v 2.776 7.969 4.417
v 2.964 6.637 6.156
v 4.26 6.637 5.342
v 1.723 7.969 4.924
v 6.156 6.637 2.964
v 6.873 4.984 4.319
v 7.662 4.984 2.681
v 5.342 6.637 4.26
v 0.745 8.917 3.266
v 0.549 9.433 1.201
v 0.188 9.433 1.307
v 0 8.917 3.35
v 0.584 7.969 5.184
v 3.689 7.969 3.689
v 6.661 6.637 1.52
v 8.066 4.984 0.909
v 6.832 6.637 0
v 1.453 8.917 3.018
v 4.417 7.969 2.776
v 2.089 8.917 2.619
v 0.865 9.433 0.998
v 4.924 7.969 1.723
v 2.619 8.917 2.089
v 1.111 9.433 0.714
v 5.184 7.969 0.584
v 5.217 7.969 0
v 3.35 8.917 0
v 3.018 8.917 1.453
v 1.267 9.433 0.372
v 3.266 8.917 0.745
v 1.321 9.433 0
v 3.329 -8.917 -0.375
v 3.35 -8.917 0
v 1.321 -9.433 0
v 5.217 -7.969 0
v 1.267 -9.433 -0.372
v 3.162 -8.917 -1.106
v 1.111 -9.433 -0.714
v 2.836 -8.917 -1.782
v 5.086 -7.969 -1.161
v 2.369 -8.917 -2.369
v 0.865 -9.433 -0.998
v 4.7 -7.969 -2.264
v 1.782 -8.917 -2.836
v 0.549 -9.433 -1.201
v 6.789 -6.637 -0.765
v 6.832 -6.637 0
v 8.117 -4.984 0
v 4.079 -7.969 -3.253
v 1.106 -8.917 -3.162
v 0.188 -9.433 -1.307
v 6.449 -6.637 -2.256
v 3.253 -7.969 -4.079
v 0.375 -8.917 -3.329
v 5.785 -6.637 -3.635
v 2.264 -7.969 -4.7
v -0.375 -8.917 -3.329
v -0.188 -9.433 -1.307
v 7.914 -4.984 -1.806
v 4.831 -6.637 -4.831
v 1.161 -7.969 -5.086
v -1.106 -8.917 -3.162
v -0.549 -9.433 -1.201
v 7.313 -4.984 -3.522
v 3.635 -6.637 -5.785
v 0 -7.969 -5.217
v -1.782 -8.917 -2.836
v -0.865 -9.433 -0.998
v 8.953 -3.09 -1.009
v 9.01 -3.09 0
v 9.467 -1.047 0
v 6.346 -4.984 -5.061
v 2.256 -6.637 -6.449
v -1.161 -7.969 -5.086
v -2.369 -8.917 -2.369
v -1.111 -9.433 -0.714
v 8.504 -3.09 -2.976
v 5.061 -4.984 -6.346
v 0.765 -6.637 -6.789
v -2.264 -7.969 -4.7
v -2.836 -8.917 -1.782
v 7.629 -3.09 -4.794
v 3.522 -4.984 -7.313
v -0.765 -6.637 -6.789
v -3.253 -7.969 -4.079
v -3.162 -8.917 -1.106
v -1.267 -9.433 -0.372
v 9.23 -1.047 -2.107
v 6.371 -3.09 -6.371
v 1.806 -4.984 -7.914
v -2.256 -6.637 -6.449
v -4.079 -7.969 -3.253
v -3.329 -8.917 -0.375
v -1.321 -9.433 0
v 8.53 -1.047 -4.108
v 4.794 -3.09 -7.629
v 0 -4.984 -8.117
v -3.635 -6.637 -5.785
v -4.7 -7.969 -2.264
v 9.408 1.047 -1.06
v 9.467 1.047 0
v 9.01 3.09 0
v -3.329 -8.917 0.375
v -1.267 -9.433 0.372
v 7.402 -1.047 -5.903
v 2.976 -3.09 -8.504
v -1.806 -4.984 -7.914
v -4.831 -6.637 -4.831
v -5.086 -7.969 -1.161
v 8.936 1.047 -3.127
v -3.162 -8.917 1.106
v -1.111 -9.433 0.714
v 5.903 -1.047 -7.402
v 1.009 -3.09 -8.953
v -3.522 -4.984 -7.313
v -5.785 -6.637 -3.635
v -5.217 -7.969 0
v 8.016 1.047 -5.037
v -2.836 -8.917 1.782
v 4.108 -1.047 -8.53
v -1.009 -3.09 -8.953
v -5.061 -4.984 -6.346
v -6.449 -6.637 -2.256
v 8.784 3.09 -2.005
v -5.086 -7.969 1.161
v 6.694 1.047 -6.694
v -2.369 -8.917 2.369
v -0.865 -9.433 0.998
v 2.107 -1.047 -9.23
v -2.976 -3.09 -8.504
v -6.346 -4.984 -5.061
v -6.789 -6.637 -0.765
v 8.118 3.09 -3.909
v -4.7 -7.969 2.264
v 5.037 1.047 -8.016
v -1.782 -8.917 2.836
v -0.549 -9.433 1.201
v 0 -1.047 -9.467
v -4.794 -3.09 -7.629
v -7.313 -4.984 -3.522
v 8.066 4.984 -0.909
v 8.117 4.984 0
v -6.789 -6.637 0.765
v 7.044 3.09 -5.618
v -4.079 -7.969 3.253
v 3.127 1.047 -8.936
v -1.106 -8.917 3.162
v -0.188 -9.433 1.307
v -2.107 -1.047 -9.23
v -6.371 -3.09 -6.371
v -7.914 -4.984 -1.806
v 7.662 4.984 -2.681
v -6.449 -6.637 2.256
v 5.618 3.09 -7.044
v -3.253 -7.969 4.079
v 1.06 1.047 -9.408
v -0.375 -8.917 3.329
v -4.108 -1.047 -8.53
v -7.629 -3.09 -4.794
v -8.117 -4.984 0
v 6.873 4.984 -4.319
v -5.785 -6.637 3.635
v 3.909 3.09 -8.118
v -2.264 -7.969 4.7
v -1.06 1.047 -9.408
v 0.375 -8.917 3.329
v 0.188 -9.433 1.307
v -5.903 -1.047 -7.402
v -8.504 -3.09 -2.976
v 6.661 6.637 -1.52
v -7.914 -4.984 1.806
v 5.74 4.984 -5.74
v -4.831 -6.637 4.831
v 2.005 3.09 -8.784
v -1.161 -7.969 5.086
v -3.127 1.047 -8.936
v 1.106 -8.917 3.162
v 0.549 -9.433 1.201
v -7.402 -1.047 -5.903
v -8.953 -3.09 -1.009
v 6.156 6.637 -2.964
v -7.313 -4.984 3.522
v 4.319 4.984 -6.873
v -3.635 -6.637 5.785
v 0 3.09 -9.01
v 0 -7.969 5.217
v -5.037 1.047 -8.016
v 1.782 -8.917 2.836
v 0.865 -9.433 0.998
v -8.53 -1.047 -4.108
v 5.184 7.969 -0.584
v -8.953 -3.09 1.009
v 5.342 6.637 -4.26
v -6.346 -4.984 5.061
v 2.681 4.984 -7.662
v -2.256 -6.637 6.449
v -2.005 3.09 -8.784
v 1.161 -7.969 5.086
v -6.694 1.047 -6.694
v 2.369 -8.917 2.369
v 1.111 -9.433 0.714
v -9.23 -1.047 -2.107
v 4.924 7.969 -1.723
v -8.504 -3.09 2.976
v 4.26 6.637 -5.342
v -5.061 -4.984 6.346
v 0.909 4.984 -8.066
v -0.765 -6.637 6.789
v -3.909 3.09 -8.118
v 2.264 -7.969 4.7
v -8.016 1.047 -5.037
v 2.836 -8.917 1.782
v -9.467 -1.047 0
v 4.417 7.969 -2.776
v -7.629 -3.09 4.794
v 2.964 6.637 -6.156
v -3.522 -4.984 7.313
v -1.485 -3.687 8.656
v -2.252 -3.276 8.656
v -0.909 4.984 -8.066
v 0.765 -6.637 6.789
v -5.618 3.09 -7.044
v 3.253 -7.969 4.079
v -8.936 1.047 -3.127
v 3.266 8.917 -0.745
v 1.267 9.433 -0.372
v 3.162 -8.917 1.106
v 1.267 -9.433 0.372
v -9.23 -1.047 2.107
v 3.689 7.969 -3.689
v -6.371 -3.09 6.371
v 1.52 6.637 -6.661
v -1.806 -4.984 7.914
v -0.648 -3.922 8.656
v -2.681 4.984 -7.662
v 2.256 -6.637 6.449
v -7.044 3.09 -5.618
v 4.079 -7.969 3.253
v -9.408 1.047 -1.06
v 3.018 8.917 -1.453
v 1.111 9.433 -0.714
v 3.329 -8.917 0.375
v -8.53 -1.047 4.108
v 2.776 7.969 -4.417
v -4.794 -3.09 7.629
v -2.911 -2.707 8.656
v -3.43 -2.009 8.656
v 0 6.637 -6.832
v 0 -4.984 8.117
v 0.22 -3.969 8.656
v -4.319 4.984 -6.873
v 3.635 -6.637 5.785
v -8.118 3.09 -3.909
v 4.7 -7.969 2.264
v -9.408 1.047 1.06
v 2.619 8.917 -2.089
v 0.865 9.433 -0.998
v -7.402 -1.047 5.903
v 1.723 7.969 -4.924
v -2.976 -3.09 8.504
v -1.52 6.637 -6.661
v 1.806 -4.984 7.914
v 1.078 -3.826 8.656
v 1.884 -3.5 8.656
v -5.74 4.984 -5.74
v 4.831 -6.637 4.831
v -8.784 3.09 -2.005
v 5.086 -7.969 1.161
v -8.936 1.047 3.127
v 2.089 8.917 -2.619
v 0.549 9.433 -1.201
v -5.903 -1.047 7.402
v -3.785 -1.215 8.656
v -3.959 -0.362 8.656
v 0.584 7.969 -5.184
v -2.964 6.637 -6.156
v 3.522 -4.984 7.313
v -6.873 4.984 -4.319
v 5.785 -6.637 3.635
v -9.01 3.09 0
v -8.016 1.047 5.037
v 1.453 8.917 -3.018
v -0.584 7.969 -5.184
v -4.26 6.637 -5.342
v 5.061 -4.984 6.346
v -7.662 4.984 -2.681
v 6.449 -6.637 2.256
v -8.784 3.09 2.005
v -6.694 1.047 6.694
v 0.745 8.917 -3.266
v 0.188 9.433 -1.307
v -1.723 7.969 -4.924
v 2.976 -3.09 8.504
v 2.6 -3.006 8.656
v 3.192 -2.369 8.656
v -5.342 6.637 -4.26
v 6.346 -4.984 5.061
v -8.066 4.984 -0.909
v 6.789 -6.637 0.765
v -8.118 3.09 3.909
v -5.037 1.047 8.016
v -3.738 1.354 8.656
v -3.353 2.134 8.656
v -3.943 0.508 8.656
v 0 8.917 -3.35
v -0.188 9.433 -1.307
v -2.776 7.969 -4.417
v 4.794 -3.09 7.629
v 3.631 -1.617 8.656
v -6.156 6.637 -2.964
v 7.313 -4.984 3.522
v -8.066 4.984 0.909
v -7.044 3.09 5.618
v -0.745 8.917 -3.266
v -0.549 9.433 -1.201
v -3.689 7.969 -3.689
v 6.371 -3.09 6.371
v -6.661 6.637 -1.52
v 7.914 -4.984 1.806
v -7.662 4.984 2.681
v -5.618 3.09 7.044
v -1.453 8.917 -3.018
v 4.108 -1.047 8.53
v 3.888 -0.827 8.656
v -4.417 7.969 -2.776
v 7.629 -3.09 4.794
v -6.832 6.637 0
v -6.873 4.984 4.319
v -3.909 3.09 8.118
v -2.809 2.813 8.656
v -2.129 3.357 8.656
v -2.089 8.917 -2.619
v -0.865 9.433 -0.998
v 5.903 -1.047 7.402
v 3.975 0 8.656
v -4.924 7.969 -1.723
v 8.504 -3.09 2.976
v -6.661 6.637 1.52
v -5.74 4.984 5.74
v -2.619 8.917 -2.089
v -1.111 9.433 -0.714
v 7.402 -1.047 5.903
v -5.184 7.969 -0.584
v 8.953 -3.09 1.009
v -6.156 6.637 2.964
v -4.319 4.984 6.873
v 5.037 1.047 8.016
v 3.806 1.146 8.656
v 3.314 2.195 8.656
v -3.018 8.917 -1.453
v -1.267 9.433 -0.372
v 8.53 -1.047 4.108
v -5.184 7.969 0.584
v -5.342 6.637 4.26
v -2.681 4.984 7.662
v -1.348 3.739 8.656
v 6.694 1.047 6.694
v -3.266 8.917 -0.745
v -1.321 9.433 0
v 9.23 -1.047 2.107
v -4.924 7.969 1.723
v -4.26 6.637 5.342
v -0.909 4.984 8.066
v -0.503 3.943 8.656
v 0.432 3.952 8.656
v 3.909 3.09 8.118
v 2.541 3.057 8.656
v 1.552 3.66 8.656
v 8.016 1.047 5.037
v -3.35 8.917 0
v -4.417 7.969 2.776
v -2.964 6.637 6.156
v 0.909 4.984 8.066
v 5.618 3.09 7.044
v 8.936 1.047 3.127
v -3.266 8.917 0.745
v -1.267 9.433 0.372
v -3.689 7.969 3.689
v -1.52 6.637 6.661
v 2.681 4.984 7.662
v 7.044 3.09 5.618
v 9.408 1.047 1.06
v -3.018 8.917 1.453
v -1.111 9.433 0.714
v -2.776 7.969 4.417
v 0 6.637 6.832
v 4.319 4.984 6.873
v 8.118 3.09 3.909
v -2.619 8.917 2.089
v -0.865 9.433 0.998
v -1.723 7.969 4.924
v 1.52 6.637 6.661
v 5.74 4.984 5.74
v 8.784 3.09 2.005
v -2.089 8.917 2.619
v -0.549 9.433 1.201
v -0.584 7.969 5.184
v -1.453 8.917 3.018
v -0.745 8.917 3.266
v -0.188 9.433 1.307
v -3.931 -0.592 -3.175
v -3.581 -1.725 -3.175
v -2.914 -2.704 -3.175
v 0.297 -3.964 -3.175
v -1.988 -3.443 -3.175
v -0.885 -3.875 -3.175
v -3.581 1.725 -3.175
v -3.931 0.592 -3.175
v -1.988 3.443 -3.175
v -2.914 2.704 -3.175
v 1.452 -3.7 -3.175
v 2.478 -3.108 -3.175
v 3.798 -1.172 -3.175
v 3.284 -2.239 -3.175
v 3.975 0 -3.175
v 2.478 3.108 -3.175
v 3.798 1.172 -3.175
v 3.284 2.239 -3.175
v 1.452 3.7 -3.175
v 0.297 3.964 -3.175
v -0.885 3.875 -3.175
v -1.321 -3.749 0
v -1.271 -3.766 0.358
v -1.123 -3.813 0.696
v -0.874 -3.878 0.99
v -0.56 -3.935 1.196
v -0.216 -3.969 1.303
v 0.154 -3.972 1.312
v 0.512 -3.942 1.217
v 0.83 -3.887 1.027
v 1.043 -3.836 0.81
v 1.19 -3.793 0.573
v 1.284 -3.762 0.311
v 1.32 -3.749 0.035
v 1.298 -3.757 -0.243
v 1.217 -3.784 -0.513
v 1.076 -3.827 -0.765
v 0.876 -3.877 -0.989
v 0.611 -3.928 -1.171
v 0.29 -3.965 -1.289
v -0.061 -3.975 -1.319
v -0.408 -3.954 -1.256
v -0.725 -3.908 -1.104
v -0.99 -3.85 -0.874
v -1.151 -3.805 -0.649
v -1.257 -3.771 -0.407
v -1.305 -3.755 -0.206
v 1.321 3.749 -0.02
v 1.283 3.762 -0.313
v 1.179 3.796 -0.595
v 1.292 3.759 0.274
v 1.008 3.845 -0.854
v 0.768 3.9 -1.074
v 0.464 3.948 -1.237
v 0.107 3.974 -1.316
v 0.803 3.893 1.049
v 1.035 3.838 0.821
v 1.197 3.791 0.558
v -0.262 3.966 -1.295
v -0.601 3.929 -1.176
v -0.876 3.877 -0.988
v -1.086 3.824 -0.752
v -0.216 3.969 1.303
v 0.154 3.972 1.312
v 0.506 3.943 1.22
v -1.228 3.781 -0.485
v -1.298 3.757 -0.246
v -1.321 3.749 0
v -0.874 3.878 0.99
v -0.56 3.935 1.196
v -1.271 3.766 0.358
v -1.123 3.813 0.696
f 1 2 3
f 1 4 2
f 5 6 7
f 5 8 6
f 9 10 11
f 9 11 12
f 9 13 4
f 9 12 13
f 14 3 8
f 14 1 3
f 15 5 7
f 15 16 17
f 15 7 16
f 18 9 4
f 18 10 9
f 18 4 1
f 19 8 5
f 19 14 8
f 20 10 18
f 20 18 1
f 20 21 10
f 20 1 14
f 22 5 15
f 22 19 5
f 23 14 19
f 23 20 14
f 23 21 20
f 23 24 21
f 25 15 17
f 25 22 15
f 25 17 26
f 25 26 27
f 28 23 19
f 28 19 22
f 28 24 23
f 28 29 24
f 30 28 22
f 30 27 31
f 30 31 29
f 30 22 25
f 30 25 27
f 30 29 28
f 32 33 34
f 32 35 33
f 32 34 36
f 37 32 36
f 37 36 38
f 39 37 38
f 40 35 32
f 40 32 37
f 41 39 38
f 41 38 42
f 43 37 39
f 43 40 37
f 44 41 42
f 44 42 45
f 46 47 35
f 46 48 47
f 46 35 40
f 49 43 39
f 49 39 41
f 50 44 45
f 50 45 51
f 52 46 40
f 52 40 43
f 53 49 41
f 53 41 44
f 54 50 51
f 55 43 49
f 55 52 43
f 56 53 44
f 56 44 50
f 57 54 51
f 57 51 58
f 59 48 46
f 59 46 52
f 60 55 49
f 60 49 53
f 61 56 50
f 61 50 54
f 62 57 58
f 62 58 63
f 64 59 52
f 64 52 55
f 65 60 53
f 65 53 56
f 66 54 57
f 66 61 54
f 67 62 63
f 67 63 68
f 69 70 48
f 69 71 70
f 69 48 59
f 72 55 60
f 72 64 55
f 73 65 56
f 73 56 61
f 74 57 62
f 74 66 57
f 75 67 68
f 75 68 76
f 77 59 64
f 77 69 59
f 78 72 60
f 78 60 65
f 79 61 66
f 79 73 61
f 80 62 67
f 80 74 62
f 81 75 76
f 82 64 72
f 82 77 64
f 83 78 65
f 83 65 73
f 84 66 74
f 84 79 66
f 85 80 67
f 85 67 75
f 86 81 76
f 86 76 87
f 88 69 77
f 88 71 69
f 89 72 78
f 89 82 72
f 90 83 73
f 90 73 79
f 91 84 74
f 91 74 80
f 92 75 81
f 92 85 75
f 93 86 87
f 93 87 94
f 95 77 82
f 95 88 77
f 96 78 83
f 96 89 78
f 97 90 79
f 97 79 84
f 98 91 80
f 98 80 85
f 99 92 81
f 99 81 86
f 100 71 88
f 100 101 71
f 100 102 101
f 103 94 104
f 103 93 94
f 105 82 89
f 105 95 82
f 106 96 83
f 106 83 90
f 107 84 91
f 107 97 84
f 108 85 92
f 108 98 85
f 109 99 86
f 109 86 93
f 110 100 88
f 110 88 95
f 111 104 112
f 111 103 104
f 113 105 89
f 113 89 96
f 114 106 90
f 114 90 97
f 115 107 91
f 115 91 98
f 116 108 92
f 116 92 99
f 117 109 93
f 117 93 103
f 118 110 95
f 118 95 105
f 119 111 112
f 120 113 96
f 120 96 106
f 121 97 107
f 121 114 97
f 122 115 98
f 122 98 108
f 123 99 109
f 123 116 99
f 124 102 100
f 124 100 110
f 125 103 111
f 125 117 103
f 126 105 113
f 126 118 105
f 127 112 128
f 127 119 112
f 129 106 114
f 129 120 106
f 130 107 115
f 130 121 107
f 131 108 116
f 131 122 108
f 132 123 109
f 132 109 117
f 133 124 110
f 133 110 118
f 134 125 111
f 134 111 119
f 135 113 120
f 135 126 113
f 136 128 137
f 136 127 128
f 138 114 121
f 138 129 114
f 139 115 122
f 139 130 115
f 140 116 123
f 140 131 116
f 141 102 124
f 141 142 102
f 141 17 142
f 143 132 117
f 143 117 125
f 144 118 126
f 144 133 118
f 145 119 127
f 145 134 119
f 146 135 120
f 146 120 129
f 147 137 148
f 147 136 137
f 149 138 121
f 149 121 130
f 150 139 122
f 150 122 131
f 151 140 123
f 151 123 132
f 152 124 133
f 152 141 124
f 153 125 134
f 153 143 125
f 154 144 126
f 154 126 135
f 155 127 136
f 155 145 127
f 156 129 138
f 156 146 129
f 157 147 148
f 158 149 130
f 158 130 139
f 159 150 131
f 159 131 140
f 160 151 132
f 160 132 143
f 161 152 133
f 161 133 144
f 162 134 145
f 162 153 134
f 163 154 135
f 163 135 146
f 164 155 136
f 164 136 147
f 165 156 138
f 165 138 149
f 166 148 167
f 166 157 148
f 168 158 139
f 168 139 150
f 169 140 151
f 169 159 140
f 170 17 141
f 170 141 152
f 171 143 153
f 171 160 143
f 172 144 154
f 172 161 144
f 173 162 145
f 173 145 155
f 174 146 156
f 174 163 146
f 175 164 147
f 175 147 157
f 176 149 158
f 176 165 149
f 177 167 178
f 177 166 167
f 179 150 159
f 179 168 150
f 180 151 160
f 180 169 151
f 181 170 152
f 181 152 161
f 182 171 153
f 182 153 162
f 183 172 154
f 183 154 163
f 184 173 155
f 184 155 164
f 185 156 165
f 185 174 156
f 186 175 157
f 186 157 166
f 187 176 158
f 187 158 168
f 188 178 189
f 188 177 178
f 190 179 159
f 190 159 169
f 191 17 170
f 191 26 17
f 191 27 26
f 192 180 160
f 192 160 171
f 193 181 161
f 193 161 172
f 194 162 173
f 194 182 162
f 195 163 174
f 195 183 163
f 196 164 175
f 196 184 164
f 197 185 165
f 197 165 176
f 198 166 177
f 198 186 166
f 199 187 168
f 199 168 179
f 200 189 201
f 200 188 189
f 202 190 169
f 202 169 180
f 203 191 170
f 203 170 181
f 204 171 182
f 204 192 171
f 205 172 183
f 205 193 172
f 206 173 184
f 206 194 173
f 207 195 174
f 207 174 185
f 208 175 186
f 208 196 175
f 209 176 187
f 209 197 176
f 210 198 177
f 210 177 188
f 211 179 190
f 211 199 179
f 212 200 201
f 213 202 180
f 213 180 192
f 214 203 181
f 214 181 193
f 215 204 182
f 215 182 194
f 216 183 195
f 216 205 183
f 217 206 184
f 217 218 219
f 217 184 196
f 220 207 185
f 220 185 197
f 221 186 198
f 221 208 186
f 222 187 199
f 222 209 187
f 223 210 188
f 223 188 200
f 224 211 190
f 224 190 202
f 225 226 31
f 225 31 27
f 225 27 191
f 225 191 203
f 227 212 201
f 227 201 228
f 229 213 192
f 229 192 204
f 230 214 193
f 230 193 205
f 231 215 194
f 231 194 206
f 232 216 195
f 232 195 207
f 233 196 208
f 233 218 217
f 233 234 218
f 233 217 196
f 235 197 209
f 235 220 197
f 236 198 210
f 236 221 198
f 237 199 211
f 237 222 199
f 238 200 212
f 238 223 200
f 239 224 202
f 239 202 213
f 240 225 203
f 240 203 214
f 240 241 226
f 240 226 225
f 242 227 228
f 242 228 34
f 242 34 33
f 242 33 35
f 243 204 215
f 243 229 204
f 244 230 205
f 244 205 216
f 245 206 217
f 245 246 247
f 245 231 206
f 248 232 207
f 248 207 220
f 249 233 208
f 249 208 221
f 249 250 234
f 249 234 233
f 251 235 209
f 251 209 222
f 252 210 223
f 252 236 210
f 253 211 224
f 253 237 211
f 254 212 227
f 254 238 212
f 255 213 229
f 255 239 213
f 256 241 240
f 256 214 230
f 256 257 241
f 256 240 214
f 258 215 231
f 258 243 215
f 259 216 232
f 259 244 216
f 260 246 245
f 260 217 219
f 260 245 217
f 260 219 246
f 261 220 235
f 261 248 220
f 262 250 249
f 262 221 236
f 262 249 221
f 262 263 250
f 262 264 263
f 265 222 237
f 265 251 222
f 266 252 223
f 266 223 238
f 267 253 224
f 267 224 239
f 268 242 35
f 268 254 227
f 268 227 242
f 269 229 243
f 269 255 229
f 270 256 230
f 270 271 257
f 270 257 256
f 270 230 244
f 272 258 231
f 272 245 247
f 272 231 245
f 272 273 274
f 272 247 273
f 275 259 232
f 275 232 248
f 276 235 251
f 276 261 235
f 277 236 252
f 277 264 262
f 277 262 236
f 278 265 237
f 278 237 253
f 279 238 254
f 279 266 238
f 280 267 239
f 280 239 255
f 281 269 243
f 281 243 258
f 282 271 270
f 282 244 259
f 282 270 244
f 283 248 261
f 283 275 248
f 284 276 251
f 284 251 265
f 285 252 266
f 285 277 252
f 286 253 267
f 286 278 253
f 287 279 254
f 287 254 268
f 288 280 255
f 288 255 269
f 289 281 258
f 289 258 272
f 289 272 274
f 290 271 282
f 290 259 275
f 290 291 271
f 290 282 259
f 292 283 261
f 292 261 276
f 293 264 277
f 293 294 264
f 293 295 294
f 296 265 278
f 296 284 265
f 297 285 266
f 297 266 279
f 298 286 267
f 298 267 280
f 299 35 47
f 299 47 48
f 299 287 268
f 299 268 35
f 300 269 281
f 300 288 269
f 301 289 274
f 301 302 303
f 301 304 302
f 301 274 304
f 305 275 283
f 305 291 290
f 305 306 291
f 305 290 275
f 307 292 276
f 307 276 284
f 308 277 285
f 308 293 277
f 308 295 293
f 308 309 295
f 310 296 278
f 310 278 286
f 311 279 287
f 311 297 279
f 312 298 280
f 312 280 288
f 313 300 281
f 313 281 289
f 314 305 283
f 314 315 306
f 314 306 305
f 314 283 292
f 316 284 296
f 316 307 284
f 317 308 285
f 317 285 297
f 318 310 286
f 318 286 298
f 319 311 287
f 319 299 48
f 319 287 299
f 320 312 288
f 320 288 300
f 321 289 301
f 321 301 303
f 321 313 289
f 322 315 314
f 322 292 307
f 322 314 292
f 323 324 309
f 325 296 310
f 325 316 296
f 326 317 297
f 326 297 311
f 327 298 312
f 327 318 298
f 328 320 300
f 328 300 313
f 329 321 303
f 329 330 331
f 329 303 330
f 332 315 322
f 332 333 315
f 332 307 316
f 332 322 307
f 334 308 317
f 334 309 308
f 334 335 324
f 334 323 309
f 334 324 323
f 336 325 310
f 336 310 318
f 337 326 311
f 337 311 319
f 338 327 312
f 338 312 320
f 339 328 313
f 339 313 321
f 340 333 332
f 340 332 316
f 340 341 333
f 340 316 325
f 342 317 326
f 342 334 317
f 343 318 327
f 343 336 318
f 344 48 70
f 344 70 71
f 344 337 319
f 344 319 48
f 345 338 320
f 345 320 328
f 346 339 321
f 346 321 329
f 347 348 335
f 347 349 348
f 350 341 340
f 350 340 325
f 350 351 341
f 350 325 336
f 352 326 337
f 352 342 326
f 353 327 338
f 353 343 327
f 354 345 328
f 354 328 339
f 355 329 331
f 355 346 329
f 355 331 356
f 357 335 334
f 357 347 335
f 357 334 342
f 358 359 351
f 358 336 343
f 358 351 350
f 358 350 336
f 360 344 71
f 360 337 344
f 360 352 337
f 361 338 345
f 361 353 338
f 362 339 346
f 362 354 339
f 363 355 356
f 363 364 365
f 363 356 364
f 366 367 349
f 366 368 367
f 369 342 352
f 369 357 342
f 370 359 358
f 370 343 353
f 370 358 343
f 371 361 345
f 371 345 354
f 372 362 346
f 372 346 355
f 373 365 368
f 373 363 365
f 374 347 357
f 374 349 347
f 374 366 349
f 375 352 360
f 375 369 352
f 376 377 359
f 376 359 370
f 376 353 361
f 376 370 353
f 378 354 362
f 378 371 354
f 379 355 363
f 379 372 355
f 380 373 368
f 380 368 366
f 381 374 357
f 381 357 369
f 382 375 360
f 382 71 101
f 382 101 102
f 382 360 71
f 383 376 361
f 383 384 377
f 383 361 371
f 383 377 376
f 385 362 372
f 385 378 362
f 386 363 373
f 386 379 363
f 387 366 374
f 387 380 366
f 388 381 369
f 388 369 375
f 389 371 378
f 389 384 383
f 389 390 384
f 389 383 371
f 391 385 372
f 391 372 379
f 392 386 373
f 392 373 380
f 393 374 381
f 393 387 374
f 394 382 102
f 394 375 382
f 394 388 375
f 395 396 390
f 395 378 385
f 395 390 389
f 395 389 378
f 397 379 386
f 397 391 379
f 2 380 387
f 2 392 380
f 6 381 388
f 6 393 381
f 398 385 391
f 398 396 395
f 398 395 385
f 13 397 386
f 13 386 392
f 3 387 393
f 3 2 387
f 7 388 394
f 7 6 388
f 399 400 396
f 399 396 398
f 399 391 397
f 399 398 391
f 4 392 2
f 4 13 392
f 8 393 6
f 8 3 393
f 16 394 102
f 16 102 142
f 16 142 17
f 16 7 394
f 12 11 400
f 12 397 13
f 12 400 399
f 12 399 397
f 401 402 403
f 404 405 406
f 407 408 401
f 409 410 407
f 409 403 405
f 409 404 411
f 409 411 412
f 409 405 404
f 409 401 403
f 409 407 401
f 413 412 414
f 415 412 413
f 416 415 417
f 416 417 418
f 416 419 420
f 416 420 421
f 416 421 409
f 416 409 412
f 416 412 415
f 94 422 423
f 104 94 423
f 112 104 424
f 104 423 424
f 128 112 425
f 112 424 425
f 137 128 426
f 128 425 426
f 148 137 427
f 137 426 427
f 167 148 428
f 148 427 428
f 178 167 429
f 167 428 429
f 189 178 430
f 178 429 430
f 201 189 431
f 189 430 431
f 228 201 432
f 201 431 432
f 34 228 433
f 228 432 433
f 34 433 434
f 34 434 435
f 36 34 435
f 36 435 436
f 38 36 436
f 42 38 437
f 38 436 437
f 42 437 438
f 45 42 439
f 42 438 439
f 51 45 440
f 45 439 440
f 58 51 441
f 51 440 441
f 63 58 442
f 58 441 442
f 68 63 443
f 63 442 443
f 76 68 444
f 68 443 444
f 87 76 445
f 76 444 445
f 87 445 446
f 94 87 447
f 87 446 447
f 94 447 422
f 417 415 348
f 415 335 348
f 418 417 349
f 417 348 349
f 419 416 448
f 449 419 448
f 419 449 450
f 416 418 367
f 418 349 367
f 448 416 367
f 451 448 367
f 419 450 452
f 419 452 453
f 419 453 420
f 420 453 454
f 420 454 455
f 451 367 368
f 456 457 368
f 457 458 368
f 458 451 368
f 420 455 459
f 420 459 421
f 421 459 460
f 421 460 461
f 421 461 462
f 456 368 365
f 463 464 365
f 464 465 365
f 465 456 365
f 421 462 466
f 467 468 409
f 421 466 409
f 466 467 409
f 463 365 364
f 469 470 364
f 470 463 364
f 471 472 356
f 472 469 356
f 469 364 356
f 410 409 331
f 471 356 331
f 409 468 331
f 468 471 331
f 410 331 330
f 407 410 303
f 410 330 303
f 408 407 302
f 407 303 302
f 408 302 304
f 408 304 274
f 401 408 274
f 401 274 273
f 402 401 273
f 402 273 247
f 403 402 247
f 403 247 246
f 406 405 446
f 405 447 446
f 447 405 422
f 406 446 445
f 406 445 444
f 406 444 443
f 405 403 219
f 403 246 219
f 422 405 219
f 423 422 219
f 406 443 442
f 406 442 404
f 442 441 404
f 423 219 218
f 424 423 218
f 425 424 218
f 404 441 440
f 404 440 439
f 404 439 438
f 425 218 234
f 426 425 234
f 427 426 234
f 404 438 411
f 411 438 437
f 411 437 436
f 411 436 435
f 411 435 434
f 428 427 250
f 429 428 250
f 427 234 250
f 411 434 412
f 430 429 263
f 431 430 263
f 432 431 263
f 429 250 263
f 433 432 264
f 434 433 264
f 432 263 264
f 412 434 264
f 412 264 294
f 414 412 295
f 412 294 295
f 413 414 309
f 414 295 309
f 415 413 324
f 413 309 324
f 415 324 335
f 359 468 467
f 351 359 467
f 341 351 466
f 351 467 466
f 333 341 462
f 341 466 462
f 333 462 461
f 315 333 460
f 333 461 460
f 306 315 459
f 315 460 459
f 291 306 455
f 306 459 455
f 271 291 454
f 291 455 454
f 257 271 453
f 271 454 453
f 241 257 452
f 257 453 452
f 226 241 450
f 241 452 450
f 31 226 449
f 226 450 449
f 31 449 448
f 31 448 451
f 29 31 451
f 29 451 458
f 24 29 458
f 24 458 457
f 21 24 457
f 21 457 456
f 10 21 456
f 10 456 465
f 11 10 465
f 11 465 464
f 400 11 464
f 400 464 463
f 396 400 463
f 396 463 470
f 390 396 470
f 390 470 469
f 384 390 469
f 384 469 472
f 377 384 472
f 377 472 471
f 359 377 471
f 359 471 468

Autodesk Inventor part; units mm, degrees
ref_plane "YZ Plane" through (0, 0, 0) normal (1, 0, 0) x (0, 1, 0)
ref_plane "XZ Plane" through (0, 0, 0) normal (0, 1, 0) x (-1, 0, 0)
sketch "Sketch1" plane through (0, 0, 0) normal (0, 0, 1) x (1, 0, 0)
  line L0 (0, 9.525) -> (0, -9.525)
  arc A0 (0, -9.525) -> (0, 9.525) centre (0, 0) ccw
  dimension "d0" = 9.525
revolve "Revolution1" add sketch "Sketch1" angle 360 about axis through (0, 9.525, 0) along (0, -1, 0)
ref_plane "Work Plane1" through (0, 0, 9.525) normal (0, 0, 1) x (1, 0, 0)
sketch "Sketch2" plane through (0, 0, 9.525) normal (0, 0, 1) x (1, 0, 0)
  circle A0 centre (0, 0) radius 3.9751
  dimension "d2" = 7.9502
extrude "Extrusion1" cut sketch "Sketch2" against normal blind 12.7
sketch "Sketch3" plane through (0, 0, 0) normal (0, 1, 0) x (-1, 0, 0)
  circle A0 centre (0, 0) radius 1.3208
  dimension "d5" = 2.6416
extrude "Extrusion2" cut sketch "Sketch3" along normal through all both and the other way through all
properties part number "Handle_Ball" material "Steel, Mild"
